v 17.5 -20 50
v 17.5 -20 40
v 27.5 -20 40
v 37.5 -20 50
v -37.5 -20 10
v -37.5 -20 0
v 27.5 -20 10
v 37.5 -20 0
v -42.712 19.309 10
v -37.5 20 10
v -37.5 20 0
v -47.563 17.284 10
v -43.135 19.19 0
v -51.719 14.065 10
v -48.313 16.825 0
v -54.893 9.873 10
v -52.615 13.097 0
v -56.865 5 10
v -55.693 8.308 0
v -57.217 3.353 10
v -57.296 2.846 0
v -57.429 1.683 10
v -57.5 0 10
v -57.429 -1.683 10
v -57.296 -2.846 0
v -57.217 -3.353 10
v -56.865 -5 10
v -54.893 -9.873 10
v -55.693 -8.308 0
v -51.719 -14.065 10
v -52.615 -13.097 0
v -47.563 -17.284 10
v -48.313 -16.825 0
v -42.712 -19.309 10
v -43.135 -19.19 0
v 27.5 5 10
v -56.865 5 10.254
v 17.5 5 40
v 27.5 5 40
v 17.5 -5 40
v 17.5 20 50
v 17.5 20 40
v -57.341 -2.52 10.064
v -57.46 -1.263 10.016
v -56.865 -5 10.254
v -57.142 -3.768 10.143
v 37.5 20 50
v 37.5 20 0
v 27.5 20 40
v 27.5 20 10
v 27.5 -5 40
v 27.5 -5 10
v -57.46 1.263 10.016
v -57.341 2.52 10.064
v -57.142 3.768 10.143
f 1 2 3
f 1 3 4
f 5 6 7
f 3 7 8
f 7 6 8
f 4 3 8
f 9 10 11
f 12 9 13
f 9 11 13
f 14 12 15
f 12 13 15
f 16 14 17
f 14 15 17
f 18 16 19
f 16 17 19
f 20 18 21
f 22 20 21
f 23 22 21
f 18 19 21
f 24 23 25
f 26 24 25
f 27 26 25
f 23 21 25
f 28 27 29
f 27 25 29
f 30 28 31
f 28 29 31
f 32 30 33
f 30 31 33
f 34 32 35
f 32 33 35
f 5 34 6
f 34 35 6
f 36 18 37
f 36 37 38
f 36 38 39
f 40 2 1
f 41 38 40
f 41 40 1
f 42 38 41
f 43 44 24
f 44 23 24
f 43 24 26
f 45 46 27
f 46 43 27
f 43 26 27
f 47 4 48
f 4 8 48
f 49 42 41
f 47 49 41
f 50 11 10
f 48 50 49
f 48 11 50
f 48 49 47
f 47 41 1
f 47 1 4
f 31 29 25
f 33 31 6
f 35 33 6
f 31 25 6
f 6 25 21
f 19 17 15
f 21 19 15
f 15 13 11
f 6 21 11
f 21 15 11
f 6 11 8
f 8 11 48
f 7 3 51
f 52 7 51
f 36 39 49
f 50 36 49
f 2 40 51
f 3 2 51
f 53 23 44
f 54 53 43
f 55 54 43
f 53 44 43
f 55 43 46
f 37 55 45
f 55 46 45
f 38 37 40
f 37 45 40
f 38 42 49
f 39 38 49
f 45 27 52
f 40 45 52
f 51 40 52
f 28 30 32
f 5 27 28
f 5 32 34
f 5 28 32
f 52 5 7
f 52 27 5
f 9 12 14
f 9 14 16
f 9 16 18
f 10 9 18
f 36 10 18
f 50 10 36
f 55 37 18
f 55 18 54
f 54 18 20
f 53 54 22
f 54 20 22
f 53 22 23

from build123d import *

# Parameters (mm, degrees)
PAD_DEPTH    = 10
SKETCH001_W  = 10
SKETCH001_H  = 40
PAD001_DEPTH = 30
SKETCH002_W  = 20
SKETCH002_H  = 40
PAD002_DEPTH = 10
PAD003_DEPTH = 30
POCKET_DEPTH = 10


with BuildPart() as part:
    # Sketch → Pad (new body)
    with BuildSketch(Plane.XY):
        with BuildLine():
            Line((37.5, -20), (37.5, 20))
            Line((37.5, 20), (-37.5, 20))
            ThreePointArc((-37.5, 20), (-57.5, 0), (-37.5, -20))
            Line((-37.5, -20), (37.5, -20))
        make_face()
    extrude(amount=PAD_DEPTH)

    # Sketch001 (on Face6 of Pad) → Pad001 (join)
    with BuildSketch(Plane.XY.offset(10)):
        with Locations((32.5, 0)):
            Rectangle(SKETCH001_W, SKETCH001_H)
    extrude(amount=PAD001_DEPTH)

    # Sketch002 (on Face5 of Pad001) → Pad002 (join)
    with BuildSketch(Plane.XY.offset(40)):
        with Locations((27.5, 0)):
            Rectangle(SKETCH002_W, SKETCH002_H)
    extrude(amount=PAD002_DEPTH)

    # Sketch003 (on Face3 of Pad002) → Pad003 (join)
    with BuildSketch(Plane.XY.offset(10)):
        with BuildLine():
            Line((-56.864917, 5), (27.5, 5))
            Line((27.5, 5), (27.5, -5))
            Line((-56.864917, -5), (27.5, -5))
            ThreePointArc((-56.864917, 5), (-57.5, 0), (-56.864917, -5))
        make_face()
    extrude(amount=PAD003_DEPTH)

    # Sketch004 (on Face15 of Pad003) → Pocket (cut)
    with BuildSketch(Plane.XZ.offset(5)):
        Polygon((-57.5, 10), (17.5, 40), (-57.5, 40), align=None)
    extrude(amount=-POCKET_DEPTH, mode=Mode.SUBTRACT)


solid = part.part
